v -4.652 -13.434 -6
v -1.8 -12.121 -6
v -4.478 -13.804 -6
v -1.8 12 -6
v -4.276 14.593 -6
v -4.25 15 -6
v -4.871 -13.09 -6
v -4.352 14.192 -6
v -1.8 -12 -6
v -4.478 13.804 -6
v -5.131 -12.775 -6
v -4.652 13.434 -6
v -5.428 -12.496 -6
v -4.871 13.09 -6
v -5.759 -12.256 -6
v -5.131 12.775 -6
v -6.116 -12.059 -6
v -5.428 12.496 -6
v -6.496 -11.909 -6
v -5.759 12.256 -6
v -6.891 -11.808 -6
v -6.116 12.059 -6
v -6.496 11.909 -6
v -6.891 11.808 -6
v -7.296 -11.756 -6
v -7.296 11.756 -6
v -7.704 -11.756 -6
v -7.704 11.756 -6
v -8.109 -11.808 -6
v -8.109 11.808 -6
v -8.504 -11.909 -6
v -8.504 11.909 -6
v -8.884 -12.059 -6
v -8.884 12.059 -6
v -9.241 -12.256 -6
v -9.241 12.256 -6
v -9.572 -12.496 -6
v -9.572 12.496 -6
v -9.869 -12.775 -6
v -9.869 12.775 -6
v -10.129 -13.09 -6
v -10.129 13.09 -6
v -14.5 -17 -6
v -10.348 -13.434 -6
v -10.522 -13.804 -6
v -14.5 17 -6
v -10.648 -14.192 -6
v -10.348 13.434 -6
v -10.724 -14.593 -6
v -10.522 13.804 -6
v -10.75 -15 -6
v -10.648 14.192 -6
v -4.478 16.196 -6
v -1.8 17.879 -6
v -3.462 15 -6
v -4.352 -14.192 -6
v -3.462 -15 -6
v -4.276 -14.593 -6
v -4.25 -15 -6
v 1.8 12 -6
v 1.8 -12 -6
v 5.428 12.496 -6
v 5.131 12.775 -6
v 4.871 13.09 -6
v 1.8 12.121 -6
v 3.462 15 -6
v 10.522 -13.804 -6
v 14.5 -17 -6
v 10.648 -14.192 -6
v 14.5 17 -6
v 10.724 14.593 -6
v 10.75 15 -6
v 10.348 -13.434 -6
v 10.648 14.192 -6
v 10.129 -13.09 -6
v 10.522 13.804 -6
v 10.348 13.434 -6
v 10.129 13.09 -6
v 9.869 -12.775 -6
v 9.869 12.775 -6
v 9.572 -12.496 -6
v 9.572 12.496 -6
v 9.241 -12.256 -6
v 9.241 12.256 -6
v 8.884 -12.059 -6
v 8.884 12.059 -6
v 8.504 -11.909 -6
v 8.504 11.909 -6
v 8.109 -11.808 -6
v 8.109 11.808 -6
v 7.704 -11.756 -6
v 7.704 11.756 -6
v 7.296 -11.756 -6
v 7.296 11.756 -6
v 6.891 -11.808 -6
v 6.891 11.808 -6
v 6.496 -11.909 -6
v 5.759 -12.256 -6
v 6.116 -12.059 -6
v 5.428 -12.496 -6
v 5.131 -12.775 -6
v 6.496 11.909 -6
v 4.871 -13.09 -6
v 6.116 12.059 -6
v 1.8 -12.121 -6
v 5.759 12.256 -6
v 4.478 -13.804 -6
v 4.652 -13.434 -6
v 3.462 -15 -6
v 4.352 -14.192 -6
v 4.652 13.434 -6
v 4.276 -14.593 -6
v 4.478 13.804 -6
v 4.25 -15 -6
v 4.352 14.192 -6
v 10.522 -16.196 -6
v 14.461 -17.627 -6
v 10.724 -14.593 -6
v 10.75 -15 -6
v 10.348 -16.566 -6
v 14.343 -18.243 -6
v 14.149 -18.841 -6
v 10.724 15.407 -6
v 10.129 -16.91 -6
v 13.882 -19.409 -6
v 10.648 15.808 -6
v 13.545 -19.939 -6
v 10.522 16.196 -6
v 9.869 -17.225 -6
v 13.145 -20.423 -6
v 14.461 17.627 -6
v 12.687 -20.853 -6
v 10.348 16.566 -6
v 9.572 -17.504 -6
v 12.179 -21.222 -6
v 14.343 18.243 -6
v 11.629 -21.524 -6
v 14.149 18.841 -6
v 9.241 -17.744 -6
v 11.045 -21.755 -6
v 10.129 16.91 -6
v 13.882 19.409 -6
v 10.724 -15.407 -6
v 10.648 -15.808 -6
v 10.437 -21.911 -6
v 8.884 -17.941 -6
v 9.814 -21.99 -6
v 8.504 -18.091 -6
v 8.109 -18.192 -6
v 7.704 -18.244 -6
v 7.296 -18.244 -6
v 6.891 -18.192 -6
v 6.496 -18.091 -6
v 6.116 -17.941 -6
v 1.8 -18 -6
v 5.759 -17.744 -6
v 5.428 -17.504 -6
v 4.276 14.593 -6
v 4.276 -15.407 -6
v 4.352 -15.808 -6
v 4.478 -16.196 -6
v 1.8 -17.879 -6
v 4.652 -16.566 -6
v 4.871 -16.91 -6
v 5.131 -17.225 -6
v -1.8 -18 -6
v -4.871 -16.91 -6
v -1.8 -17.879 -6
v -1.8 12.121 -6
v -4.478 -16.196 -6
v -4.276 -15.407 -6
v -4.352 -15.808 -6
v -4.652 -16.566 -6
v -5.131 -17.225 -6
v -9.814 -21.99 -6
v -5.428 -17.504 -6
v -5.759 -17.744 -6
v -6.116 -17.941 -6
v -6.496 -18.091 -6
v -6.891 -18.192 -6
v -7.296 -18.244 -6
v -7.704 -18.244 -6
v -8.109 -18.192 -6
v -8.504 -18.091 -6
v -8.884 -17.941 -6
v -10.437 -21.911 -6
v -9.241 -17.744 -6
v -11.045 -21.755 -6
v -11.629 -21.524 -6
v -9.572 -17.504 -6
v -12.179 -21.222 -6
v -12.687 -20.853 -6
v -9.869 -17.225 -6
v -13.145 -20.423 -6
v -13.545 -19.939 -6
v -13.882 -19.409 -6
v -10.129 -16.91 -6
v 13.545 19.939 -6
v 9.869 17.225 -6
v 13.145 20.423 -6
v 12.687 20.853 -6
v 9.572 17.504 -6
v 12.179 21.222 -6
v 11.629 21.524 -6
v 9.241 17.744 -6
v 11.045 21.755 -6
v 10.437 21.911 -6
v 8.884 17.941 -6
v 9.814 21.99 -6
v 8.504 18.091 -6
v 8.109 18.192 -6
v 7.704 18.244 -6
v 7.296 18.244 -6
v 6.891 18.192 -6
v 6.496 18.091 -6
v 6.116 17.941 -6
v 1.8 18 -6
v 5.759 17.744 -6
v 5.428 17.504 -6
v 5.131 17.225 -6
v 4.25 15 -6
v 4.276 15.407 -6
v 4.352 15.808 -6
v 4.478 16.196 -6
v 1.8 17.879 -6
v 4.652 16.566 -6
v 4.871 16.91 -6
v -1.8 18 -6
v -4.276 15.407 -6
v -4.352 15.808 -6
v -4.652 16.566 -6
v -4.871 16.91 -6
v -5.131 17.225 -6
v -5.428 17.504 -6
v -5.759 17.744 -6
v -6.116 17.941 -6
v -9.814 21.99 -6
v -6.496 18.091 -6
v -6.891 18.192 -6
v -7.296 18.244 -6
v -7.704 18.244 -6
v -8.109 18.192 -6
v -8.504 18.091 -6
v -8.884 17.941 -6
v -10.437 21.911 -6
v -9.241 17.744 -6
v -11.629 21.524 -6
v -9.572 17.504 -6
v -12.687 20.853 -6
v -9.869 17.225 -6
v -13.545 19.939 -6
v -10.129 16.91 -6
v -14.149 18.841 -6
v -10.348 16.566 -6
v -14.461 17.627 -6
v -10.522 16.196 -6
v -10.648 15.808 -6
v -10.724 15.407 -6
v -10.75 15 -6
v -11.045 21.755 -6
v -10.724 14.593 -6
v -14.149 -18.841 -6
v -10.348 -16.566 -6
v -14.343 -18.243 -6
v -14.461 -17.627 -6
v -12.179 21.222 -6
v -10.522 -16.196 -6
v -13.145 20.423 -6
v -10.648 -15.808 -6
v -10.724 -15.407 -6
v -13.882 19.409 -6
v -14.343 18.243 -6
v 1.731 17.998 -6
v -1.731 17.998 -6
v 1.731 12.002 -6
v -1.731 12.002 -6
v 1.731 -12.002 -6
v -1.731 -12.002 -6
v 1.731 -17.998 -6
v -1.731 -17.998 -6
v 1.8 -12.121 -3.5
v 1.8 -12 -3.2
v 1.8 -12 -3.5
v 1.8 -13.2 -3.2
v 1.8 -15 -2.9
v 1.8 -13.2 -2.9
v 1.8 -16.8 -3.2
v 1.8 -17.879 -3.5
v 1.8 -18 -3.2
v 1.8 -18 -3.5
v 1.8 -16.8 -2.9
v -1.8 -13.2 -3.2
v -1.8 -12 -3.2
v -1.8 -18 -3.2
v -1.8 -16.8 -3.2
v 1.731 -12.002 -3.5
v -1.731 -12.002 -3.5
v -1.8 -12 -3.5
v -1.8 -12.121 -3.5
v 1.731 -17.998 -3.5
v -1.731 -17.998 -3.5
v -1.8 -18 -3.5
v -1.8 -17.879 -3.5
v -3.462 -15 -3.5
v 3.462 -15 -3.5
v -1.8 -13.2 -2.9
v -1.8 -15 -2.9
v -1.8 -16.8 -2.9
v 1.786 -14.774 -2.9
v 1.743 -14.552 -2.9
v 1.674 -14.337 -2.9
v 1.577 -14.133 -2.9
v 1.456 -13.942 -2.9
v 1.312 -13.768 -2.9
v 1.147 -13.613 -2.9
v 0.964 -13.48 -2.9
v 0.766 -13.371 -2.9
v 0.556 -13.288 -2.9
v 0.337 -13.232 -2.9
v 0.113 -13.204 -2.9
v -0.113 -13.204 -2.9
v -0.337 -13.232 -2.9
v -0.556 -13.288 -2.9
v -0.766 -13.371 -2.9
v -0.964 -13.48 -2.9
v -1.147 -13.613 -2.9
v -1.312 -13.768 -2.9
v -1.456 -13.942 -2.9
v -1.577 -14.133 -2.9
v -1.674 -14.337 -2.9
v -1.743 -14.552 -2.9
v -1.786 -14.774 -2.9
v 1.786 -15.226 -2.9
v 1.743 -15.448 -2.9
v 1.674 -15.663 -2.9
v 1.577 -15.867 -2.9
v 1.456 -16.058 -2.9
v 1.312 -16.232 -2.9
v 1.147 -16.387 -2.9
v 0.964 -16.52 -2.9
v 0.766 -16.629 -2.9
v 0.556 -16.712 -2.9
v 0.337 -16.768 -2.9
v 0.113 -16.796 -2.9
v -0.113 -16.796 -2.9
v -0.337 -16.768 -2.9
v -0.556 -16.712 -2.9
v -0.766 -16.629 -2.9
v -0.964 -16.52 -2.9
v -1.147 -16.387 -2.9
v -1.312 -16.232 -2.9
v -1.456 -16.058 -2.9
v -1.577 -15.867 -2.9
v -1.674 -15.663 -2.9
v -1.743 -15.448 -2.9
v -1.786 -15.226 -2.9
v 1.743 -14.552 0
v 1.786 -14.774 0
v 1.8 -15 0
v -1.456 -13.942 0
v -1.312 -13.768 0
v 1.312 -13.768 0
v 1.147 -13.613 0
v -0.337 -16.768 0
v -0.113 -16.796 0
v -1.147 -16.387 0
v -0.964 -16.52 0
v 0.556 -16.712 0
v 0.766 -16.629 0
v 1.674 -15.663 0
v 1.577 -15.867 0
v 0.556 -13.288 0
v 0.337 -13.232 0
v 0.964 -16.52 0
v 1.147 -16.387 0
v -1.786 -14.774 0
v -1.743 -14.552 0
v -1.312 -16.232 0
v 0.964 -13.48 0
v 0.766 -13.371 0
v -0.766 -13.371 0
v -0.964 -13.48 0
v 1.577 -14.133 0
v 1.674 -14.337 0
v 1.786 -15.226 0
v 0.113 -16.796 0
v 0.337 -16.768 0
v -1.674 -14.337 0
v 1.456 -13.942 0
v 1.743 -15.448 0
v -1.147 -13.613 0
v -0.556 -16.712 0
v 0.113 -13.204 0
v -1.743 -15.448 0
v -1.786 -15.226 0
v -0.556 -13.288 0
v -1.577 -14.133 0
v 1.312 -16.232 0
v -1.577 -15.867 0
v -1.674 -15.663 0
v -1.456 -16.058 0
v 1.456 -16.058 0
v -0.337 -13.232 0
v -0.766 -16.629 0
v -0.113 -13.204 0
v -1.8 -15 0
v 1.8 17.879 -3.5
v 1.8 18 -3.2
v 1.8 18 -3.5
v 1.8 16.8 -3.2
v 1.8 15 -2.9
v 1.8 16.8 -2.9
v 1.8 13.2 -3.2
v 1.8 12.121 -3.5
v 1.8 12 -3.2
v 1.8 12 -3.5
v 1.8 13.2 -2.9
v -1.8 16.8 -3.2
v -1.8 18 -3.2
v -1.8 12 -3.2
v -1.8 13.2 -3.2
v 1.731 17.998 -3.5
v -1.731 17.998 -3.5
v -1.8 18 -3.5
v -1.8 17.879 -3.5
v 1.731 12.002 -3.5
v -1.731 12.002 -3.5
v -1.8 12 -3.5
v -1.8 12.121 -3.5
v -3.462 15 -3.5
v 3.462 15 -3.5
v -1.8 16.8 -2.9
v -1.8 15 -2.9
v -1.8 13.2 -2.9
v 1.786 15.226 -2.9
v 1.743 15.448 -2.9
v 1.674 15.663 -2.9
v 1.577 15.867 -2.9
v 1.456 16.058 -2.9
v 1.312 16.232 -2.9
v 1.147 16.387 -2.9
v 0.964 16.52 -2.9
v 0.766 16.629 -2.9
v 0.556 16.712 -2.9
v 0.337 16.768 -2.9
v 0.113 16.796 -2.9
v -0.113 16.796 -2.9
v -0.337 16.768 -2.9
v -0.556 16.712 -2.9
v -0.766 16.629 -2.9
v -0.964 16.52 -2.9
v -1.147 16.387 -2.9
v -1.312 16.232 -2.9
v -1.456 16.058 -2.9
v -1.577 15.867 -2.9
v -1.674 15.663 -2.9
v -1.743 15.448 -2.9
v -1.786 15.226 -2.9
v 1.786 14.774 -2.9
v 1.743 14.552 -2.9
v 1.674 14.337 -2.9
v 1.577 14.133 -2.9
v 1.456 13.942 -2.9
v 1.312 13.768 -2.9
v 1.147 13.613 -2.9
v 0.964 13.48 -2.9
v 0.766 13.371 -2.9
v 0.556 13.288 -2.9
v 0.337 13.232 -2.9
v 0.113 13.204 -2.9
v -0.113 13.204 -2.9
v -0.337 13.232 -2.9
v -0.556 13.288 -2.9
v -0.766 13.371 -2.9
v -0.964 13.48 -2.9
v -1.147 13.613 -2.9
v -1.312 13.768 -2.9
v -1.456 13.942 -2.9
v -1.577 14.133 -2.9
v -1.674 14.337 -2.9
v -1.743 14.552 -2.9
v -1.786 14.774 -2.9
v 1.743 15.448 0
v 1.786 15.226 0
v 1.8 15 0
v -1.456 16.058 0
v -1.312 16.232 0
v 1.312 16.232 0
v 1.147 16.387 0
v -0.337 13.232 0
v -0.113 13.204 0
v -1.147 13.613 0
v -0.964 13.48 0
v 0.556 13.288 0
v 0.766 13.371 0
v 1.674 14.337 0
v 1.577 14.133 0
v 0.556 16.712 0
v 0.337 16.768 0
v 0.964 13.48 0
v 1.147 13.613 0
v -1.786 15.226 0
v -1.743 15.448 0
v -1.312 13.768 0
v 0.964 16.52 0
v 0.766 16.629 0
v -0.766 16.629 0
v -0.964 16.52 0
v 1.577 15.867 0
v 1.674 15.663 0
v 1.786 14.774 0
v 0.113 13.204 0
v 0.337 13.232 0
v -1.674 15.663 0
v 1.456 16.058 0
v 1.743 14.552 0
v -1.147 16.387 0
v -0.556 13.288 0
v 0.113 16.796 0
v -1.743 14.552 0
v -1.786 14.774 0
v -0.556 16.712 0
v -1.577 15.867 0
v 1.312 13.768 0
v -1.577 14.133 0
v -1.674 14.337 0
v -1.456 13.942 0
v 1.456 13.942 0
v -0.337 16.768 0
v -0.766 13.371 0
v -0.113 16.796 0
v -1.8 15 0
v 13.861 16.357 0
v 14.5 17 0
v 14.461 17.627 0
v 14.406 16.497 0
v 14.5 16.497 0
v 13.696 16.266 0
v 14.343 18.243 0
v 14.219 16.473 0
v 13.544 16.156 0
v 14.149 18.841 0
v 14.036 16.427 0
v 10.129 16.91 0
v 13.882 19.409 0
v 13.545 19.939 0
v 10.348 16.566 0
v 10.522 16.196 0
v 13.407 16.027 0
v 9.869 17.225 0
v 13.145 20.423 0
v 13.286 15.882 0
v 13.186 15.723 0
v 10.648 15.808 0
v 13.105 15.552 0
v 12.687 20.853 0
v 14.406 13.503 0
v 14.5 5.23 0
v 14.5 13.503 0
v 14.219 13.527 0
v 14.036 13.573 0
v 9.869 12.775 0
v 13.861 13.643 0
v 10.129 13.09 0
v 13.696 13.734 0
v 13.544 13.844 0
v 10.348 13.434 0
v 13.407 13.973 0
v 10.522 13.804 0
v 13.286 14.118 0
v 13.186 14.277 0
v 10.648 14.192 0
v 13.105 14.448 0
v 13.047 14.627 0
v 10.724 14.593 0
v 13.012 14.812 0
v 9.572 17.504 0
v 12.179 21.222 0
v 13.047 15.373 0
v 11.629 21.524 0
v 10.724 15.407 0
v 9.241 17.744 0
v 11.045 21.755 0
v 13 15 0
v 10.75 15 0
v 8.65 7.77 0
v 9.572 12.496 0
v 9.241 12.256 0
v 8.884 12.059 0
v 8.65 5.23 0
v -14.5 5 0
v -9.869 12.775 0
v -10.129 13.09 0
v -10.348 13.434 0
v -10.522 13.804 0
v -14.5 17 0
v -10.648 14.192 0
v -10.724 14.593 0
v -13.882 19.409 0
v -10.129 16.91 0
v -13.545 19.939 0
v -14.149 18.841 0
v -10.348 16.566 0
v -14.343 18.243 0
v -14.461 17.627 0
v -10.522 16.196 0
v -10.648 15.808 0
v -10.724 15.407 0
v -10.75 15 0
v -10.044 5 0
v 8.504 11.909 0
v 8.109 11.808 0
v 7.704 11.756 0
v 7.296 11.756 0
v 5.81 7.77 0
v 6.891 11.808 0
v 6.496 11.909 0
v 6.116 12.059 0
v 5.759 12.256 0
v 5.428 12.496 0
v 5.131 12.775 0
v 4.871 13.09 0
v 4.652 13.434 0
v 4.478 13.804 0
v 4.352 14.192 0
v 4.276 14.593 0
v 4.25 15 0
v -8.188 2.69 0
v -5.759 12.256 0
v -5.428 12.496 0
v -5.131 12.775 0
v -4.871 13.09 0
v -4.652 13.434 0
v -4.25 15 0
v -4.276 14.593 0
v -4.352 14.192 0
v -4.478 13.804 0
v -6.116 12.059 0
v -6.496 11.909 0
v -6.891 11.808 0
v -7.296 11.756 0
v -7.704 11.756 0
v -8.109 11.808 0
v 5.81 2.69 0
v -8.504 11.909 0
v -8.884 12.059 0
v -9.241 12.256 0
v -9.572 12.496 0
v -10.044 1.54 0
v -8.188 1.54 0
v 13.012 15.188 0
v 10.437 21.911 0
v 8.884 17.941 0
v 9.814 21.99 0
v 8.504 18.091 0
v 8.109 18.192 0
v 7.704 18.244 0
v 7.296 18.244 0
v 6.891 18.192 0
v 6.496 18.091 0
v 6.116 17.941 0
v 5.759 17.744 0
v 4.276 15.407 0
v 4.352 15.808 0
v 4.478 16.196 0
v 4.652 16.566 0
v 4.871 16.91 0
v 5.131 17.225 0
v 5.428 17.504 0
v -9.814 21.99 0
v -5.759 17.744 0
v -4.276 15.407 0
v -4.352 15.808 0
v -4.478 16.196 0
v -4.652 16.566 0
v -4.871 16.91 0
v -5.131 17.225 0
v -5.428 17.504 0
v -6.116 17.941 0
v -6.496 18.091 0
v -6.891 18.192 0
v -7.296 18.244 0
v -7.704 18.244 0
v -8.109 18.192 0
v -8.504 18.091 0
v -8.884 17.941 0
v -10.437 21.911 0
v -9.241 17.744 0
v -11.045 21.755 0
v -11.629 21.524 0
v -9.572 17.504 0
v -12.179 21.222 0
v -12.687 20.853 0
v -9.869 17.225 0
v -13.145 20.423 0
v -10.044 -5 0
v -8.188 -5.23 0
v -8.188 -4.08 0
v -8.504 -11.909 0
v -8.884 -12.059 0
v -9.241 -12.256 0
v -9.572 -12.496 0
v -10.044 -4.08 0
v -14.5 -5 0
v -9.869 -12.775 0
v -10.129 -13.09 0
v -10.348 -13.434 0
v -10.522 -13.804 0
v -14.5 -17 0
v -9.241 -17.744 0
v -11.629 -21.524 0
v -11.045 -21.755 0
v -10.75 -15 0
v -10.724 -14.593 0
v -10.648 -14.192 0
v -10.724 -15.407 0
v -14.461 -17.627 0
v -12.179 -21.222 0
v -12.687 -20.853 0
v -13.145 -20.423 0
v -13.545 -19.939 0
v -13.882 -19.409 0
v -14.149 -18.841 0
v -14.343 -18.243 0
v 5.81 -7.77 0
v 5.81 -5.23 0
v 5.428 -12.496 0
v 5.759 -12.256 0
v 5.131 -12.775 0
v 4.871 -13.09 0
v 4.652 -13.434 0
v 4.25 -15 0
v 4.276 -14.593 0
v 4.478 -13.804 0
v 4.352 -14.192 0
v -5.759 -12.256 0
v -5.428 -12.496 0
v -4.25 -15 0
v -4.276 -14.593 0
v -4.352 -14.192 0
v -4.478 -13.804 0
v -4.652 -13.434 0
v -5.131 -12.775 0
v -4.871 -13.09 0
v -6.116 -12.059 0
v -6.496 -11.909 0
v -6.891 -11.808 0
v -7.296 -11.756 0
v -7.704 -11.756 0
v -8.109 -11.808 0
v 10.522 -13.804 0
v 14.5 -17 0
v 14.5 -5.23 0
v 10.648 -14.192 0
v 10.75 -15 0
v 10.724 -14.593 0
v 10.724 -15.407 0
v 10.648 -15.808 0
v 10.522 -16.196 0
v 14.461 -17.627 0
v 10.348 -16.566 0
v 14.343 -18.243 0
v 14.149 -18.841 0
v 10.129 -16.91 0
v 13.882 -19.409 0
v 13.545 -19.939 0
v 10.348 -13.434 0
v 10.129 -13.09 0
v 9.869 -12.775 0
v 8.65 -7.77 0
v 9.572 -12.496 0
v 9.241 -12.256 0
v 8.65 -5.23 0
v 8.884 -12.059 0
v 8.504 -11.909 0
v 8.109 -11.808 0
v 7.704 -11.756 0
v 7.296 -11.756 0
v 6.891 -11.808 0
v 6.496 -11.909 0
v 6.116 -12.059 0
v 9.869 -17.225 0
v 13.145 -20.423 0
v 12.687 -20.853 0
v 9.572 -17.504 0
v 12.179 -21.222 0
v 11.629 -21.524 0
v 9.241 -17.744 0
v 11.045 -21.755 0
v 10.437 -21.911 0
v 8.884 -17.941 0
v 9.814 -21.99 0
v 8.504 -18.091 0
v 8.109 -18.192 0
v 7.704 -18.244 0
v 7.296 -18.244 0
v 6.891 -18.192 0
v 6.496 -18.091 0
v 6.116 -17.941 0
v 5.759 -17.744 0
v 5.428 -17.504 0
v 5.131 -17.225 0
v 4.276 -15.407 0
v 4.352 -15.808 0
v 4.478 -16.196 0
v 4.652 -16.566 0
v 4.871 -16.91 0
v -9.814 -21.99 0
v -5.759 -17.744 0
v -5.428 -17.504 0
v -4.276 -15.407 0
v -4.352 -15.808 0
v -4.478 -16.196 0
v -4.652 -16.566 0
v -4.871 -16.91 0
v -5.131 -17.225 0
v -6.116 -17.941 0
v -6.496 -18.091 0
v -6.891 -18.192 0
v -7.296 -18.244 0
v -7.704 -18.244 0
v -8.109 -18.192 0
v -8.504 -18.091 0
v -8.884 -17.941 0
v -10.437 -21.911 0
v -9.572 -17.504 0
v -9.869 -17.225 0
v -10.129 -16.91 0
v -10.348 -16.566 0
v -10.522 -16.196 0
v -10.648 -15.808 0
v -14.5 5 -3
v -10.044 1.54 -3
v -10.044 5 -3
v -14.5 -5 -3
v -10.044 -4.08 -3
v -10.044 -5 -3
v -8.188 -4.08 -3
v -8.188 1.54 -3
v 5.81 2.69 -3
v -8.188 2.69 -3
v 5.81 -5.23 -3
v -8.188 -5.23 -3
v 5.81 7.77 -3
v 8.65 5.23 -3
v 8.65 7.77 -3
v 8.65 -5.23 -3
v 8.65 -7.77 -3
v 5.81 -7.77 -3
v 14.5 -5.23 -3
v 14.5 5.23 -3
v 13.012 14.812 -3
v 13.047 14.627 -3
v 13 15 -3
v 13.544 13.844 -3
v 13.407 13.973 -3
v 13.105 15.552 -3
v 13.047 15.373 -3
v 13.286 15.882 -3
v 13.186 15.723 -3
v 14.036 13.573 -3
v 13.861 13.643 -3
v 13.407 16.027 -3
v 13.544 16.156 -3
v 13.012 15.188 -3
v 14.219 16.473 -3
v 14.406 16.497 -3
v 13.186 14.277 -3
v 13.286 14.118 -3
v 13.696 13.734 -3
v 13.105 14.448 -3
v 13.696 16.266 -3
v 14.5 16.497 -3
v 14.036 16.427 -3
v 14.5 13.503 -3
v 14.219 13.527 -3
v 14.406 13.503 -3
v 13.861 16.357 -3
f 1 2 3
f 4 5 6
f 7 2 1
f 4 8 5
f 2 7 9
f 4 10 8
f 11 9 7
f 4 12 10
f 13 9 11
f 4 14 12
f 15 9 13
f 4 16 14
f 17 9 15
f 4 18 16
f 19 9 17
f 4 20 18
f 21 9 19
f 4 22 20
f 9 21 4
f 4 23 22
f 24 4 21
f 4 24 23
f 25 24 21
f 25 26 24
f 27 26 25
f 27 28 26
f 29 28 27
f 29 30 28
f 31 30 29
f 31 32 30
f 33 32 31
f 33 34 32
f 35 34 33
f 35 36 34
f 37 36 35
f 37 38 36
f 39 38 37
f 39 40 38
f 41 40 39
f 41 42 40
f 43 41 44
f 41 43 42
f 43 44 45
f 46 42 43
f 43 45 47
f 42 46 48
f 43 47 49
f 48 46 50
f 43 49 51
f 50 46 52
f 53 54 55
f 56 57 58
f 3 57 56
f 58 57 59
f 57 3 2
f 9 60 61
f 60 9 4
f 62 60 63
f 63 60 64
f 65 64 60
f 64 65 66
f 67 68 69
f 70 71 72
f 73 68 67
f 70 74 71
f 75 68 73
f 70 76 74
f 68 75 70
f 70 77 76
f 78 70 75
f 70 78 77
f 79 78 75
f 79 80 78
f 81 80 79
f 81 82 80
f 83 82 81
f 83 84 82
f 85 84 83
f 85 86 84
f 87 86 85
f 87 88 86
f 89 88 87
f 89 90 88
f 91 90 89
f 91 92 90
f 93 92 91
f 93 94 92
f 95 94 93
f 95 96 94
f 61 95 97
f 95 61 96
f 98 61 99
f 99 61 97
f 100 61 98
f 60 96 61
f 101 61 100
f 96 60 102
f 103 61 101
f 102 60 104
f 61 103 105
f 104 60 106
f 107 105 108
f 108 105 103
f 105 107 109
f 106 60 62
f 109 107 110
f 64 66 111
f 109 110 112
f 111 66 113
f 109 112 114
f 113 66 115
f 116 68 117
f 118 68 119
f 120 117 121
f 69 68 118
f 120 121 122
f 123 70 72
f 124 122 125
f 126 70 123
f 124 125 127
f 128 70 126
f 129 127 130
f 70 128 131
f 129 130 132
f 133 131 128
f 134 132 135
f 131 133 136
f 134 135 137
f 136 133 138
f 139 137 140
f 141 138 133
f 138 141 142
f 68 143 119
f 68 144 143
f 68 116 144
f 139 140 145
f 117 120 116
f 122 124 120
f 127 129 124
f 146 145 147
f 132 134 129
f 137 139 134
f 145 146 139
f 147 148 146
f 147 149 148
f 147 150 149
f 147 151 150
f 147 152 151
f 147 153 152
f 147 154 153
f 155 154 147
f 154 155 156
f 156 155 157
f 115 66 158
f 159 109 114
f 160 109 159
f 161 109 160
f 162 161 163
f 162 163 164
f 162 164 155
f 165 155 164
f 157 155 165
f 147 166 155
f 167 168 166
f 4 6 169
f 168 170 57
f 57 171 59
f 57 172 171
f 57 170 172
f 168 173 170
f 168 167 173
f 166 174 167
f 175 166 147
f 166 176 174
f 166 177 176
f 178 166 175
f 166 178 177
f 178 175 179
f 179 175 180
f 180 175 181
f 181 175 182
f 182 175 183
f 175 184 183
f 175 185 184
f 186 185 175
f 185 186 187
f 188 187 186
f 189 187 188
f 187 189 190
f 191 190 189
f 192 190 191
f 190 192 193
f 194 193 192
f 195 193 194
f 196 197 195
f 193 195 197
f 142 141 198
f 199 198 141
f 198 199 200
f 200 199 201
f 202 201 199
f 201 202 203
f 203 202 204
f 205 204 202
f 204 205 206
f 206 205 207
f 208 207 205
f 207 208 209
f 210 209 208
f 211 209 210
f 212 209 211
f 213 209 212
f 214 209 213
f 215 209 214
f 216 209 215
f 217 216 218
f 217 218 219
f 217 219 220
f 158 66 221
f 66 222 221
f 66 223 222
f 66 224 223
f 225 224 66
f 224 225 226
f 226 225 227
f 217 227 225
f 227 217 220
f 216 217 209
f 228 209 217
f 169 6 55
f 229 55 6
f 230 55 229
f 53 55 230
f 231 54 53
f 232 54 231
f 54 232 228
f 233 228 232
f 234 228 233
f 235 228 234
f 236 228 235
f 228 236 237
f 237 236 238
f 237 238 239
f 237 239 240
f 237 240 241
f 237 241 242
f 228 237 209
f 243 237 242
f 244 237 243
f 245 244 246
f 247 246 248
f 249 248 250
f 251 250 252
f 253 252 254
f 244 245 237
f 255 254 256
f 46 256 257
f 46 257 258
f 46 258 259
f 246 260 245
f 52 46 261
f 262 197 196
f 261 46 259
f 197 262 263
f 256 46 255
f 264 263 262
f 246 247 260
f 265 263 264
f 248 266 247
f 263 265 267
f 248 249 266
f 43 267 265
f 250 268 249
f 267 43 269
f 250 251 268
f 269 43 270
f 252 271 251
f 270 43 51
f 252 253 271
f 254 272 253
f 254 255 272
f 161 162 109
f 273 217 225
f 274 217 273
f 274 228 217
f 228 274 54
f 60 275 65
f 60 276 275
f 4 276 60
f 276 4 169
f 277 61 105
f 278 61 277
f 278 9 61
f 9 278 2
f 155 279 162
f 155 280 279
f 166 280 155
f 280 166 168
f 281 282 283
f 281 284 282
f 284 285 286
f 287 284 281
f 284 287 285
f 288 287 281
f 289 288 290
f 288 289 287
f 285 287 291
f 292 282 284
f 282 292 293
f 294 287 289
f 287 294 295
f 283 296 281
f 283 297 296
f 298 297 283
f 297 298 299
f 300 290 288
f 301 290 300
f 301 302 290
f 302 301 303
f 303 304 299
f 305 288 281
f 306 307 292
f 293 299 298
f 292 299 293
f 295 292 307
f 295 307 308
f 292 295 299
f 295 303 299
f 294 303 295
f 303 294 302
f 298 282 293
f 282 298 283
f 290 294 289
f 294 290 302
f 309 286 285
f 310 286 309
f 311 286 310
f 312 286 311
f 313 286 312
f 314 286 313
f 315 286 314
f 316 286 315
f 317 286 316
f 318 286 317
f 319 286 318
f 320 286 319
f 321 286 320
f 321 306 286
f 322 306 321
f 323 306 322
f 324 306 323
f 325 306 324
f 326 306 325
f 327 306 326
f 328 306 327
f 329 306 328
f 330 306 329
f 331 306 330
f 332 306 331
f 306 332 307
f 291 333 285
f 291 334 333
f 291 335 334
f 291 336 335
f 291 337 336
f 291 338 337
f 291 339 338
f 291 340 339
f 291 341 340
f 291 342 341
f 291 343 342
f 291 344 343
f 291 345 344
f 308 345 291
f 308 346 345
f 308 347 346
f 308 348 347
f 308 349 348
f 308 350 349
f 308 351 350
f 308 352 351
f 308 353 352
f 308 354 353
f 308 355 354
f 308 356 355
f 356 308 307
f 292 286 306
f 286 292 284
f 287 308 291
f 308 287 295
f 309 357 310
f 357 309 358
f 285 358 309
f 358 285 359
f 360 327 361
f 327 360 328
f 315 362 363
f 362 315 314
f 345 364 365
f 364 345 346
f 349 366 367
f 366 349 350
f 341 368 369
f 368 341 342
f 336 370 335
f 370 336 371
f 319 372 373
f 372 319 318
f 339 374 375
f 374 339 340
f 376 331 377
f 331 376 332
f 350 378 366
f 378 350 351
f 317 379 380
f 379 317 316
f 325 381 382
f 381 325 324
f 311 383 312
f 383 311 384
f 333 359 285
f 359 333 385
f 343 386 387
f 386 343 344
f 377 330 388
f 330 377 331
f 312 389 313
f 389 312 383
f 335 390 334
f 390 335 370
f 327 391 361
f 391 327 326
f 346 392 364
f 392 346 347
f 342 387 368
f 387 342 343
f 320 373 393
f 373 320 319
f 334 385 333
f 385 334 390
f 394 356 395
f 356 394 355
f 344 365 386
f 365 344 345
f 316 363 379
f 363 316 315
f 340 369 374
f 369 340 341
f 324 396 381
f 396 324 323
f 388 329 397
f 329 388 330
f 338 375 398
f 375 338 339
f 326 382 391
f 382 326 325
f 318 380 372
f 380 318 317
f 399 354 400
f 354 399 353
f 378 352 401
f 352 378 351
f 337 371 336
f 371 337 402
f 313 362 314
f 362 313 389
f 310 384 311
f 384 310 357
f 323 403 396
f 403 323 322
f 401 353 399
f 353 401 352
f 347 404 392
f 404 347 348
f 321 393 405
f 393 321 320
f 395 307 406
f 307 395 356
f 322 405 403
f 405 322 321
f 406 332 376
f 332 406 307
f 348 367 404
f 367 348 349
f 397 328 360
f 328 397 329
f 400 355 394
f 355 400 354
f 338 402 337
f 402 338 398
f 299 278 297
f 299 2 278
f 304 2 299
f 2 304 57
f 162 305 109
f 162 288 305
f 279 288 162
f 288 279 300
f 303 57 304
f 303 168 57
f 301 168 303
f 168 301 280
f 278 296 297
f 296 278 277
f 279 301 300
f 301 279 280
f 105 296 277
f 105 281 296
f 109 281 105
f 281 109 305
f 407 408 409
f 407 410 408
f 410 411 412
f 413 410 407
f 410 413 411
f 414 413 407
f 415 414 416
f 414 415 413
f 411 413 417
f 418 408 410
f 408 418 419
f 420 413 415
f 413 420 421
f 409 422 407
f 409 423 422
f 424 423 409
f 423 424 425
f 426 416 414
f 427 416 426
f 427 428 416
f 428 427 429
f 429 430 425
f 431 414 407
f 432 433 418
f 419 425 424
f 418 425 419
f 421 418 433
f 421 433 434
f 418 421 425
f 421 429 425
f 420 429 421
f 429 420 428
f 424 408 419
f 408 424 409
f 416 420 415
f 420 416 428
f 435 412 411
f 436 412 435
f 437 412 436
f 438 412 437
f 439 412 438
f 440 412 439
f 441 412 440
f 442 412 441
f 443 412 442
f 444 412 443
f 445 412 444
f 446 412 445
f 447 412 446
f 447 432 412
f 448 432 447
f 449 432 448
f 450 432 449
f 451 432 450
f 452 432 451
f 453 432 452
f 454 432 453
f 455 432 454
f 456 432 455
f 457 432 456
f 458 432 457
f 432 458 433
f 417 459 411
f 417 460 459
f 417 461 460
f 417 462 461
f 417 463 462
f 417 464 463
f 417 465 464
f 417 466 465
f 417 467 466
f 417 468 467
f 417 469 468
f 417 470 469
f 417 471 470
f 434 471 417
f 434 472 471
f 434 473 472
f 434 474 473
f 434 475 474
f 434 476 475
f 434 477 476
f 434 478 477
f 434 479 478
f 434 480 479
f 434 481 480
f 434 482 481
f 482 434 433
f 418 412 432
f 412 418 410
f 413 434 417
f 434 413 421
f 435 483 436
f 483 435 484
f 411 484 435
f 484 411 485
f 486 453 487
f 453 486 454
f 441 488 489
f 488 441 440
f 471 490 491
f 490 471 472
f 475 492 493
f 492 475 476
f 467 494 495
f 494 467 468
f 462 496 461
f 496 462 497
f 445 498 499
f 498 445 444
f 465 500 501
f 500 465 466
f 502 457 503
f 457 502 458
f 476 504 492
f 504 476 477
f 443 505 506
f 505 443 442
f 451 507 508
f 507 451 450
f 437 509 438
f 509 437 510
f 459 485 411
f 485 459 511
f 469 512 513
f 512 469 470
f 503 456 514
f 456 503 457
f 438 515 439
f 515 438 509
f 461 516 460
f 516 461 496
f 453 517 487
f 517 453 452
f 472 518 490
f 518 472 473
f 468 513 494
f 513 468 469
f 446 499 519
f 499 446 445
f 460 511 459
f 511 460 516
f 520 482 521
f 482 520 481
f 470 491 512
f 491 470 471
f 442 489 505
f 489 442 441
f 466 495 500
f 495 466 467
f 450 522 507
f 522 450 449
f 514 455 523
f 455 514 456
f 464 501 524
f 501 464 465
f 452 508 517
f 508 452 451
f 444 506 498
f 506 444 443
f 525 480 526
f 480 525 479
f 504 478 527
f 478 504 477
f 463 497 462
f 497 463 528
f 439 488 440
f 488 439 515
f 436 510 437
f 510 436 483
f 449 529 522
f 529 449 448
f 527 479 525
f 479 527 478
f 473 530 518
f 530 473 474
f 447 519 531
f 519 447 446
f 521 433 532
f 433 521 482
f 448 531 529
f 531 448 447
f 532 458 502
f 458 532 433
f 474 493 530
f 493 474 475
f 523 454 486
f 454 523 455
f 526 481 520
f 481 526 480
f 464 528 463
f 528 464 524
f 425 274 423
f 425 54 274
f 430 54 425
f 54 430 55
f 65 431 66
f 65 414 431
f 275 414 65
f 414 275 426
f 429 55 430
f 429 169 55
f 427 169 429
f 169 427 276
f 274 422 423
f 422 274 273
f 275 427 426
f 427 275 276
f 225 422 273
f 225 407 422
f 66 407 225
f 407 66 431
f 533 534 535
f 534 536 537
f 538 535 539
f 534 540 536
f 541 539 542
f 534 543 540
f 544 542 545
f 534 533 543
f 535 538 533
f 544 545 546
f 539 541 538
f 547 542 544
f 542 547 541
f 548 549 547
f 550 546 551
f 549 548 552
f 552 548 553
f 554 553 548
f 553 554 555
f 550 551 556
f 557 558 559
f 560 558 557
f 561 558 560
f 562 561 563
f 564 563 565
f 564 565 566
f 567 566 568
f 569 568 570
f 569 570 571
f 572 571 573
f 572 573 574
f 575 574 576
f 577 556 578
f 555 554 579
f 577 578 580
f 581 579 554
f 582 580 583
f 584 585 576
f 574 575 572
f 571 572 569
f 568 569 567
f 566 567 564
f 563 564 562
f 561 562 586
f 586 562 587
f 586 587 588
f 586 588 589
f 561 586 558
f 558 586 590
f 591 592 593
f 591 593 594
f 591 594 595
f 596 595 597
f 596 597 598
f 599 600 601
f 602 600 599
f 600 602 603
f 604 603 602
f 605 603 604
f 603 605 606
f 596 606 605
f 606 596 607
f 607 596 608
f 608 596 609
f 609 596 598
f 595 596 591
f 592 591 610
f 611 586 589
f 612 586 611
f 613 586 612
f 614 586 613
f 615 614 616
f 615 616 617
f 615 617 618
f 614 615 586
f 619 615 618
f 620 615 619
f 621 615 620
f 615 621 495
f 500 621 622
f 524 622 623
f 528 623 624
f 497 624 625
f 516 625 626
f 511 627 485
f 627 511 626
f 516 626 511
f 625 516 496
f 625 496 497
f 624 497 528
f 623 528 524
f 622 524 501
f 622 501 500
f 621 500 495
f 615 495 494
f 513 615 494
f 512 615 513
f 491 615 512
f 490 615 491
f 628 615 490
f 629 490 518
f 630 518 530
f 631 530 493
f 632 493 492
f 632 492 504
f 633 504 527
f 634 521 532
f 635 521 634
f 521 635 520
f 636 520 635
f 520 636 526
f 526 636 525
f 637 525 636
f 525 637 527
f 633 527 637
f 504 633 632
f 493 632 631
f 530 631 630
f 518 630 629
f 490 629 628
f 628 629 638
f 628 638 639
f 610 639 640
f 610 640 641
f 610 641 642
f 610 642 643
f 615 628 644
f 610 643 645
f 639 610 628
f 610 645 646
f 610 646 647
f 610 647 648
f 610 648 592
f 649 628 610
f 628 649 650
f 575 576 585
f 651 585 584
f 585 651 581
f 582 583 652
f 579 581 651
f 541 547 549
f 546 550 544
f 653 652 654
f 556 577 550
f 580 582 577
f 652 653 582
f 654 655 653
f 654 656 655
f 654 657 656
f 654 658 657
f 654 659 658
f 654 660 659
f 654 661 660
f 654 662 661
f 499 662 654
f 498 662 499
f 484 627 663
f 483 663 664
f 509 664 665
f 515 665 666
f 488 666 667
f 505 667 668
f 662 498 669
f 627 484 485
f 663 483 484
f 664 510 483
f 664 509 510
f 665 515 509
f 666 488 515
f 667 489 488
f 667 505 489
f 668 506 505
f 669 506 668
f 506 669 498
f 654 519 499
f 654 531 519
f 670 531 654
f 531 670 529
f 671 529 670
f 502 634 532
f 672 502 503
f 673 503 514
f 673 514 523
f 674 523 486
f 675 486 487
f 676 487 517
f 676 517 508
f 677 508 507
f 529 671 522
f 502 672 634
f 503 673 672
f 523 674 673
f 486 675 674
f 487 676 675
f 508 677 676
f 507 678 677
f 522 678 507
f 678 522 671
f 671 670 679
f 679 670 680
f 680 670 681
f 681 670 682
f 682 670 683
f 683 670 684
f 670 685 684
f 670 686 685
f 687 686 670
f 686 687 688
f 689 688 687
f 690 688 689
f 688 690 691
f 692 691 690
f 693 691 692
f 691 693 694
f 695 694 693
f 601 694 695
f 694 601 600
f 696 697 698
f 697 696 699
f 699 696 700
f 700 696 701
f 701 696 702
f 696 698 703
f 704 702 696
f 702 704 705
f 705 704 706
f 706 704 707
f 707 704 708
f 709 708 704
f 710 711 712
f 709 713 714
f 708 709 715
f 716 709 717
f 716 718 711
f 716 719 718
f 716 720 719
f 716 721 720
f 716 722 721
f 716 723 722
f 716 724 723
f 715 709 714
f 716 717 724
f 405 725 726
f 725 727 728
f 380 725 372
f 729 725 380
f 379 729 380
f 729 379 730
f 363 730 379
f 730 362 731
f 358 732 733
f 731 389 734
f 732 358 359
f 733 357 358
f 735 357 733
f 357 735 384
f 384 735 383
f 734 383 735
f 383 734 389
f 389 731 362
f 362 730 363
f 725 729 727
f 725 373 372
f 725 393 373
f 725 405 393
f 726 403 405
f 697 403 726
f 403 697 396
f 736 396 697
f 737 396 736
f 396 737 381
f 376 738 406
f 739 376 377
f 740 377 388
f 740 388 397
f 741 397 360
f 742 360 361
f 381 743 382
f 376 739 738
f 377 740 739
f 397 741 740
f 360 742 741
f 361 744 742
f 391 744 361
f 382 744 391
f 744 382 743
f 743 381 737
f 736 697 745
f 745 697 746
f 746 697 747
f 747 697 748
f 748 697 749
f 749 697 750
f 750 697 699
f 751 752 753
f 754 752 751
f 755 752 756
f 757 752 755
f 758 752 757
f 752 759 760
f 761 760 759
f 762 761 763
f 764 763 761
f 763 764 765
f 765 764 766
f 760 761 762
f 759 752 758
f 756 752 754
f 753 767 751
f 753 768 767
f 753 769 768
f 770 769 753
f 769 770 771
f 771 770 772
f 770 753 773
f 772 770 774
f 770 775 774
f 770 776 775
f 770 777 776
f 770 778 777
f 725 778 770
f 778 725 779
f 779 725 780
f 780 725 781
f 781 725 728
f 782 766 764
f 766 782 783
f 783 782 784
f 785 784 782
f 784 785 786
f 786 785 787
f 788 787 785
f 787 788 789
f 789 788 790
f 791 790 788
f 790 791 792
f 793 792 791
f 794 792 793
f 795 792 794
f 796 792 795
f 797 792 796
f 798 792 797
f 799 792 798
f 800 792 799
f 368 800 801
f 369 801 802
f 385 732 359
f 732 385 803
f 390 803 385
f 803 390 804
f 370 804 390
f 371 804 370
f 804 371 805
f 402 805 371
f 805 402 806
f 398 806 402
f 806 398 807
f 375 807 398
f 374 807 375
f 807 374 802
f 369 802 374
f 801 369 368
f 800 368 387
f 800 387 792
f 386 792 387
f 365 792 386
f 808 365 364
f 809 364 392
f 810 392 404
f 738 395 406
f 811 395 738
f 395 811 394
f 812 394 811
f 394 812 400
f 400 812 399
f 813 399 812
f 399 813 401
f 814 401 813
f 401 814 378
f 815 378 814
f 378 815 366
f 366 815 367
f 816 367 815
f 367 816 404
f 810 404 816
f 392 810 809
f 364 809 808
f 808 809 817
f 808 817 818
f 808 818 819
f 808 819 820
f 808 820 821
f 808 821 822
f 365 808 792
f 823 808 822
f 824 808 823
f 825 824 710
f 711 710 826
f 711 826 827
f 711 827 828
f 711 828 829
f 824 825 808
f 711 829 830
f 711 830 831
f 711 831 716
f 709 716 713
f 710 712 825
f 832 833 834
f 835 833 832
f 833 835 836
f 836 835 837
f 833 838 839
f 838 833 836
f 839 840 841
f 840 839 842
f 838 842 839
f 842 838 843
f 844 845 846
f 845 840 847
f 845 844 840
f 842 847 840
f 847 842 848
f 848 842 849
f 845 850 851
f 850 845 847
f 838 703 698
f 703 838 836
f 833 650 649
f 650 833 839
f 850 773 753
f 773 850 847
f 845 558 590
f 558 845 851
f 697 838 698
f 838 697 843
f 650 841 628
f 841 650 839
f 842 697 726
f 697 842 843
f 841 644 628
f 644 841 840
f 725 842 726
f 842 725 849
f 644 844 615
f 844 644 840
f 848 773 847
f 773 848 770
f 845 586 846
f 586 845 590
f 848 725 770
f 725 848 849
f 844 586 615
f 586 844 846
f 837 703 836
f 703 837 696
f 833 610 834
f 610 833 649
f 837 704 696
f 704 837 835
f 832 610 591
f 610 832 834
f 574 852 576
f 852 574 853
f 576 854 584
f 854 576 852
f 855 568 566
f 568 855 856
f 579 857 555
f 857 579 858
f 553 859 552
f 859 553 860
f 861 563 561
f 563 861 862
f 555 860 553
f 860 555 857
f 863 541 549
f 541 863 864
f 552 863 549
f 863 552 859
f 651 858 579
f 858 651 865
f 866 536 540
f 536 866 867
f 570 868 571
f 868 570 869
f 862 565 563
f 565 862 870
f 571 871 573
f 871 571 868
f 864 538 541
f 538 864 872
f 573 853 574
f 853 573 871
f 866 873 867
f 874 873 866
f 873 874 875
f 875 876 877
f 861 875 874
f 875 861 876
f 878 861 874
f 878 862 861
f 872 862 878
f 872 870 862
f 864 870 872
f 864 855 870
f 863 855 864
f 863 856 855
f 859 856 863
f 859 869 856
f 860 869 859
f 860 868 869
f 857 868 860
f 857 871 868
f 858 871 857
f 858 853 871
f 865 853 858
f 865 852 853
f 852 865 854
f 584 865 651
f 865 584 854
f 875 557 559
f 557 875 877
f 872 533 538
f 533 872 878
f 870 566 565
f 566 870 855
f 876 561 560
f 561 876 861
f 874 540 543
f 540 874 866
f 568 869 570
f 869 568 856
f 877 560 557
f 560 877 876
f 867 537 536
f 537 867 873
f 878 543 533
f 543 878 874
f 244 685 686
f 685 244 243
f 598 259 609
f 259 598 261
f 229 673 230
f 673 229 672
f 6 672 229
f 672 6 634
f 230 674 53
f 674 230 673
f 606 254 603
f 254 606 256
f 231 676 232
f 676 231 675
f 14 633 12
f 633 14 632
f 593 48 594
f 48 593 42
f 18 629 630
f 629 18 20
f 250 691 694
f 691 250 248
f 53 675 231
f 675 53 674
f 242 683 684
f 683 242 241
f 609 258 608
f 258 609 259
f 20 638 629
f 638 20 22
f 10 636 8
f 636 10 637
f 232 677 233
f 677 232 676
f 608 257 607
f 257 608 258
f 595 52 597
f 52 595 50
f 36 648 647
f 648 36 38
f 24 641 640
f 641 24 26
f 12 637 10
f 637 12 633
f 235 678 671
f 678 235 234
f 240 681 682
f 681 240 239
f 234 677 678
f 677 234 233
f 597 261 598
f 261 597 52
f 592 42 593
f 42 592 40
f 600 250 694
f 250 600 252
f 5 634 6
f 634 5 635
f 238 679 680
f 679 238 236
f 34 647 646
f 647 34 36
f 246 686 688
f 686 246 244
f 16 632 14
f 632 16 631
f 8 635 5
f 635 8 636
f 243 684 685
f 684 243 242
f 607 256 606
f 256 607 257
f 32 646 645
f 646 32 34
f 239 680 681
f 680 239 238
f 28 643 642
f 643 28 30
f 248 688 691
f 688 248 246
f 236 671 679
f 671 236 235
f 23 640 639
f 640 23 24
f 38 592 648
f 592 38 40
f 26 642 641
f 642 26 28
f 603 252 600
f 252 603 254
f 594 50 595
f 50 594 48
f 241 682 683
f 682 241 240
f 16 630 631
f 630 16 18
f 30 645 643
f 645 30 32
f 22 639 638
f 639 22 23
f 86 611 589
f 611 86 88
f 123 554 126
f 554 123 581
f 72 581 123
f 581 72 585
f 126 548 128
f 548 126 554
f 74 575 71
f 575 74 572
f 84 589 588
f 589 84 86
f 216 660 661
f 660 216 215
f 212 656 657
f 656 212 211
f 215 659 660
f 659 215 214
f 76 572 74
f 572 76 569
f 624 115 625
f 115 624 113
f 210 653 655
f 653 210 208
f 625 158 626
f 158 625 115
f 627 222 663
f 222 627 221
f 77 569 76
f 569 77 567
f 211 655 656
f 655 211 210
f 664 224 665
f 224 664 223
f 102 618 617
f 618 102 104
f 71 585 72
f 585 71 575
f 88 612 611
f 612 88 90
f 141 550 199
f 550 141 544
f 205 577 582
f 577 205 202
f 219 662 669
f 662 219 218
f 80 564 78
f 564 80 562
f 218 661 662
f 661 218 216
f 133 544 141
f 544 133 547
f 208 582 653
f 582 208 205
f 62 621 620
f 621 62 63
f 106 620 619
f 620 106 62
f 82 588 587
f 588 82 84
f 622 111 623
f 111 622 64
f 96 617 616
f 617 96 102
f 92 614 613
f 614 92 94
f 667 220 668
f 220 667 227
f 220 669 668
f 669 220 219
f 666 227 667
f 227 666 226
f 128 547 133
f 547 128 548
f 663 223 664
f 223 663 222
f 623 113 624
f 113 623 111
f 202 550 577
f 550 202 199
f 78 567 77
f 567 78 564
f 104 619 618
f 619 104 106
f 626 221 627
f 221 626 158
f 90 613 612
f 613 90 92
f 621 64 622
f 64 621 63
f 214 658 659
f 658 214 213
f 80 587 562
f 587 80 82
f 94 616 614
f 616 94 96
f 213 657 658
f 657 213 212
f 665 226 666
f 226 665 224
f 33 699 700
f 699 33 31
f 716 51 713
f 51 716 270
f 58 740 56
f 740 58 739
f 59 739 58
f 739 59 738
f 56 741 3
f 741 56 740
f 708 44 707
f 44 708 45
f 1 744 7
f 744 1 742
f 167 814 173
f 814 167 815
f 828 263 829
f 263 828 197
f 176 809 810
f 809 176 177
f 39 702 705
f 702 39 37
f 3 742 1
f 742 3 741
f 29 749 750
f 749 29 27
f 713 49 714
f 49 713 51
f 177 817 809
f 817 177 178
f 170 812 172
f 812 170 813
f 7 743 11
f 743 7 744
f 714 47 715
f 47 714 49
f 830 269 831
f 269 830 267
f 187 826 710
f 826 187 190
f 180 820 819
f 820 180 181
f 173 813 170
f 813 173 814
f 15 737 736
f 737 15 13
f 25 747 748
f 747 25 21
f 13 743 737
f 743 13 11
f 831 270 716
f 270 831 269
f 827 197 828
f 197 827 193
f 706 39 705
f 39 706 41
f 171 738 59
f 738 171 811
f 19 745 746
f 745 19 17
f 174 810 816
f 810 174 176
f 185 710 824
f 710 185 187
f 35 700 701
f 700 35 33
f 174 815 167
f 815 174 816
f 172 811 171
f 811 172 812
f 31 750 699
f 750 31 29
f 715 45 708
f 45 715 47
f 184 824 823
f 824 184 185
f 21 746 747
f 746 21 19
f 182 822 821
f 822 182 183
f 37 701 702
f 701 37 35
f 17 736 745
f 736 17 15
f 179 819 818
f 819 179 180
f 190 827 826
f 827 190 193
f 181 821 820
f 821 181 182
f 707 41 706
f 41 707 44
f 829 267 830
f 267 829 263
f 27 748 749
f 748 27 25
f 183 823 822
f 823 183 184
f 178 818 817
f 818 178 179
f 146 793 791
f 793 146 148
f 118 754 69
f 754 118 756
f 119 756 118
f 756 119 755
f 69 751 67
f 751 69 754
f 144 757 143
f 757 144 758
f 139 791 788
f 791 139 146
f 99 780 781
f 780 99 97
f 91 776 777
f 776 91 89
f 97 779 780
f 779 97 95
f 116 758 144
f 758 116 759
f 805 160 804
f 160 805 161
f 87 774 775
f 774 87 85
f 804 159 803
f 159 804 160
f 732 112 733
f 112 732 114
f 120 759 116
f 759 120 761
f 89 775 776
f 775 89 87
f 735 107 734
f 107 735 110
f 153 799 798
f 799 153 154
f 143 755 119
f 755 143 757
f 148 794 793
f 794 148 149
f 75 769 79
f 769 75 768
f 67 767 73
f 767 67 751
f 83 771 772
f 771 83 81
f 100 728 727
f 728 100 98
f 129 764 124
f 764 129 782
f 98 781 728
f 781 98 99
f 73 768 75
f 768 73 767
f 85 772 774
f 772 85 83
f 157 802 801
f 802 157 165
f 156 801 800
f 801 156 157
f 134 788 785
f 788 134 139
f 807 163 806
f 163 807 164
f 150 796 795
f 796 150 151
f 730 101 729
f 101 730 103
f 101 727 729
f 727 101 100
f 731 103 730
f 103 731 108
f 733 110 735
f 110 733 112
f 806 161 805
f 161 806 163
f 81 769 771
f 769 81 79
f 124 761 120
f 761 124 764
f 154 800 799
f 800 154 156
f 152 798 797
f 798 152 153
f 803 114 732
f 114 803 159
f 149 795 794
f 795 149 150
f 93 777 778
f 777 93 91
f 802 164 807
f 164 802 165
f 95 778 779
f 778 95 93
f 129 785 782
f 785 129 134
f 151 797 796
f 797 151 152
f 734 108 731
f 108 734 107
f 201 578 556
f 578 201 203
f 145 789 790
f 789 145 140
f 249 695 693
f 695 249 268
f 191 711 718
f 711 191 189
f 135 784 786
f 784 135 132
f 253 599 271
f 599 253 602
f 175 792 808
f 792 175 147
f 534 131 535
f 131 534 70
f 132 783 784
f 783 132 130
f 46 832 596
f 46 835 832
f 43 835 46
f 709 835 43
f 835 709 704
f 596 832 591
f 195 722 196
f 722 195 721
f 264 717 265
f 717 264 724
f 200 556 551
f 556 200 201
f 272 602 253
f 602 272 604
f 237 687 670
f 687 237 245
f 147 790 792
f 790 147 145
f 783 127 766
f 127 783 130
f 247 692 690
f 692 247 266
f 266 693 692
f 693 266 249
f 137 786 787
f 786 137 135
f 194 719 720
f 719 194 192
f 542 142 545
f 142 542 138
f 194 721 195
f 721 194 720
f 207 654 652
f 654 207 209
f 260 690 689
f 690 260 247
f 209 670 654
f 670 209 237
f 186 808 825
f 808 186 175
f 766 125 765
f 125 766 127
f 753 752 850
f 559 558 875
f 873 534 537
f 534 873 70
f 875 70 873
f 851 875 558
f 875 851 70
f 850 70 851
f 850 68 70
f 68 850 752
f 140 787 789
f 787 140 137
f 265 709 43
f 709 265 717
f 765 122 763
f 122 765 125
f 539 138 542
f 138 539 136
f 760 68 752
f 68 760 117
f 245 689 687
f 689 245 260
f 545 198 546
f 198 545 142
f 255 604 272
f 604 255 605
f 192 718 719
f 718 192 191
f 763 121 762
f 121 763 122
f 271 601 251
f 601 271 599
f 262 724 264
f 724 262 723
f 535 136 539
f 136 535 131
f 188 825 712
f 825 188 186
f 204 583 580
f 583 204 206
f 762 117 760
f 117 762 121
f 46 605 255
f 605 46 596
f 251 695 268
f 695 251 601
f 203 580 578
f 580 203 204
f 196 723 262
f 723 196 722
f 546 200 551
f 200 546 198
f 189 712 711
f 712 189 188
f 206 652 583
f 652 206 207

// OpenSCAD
$fn = 50;


difference() {
	union() {
		*color(alpha = 1.0000000000, c = "gray") {
			translate(v = [0, 14, -6]) {
				linear_extrude(height = 3) {
					text(font = "Arial:style=Bold", halign = "center", size = 4.5000000000, text = "COMMENT description oobb_plate_shape_positive_type_6_depth_0_0_-6_pos_basic_extra_6_thickness_2_width_3_height_0_0_-6_pos_plate", valign = "center");
				}
			}
		}
		translate(v = [0, 0, -6]) {
			hull() {
				translate(v = [-9.5000000000, 17.0000000000, 0]) {
					cylinder(h = 6, r = 5);
				}
				translate(v = [9.5000000000, 17.0000000000, 0]) {
					cylinder(h = 6, r = 5);
				}
				translate(v = [-9.5000000000, -17.0000000000, 0]) {
					cylinder(h = 6, r = 5);
				}
				translate(v = [9.5000000000, -17.0000000000, 0]) {
					cylinder(h = 6, r = 5);
				}
			}
		}
		*color(alpha = 1.0000000000, c = "gray") {
			translate(v = [0, 14, -6]) {
				linear_extrude(height = 3) {
					text(font = "Arial:style=Bold", halign = "center", size = 4.5000000000, text = "COMMENT description oobb_holes_shape_p_type_0_0_-6_pos_basic_extra_6_thickness_2_width_3_height_0_0_-6_pos_plate_'left'_'right'_hole_sides_'left'_'right'_holes_true_both_holes", valign = "center");
				}
			}
		}
		*color(alpha = 1.0000000000, c = "gray") {
			translate(v = [-7.5000000000, 14, -3]) {
				rotate(a = [0, 0, 180]) {
					linear_extrude(height = 3) {
						text(font = "Arial:style=Bold", halign = "center", size = 4.5000000000, text = "COMMENT description oobb_wire_basic_shape_-7.5_0_-3_pos_basic_extra_6_thickness_2_width_3_height_0_0_-6_pos_plate_0_0_180_rot", valign = "center");
					}
				}
			}
		}
	}
	union() {
		translate(v = [0, -15, -6]) {
			rotate(a = [0, 0, 0]) {
				difference() {
					union() {
						translate(v = [-1.8000000000, -3.0000000000, -0.3000000000]) {
							cube(size = [3.6000000000, 6.0000000000, 0.3000000000]);
						}
						translate(v = [-1.8000000000, -1.8000000000, -0.6000000000]) {
							cube(size = [3.6000000000, 3.6000000000, 0.3000000000]);
						}
						translate(v = [-1.8000000000, -3.0000000000, 2.5000000000]) {
							cube(size = [3.6000000000, 6.0000000000, 0.3000000000]);
						}
						translate(v = [-1.8000000000, -1.8000000000, 2.8000000000]) {
							cube(size = [3.6000000000, 3.6000000000, 0.3000000000]);
						}
						translate(v = [0, 0, -50.0000000000]) {
							cylinder(h = 100, r = 1.8000000000);
						}
						linear_extrude(height = 2.5000000000) {
							polygon(points = [[3.4620000000, 0.0000000000], [1.7310000000, 2.9981799479], [-1.7310000000, 2.9981799479], [-3.4620000000, 0.0000000000], [-1.7310000000, -2.9981799479], [1.7310000000, -2.9981799479]]);
						}
						translate(v = [-1.8000000000, -3.0000000000, -0.3000000000]) {
							cube(size = [3.6000000000, 6.0000000000, 0.3000000000]);
						}
						translate(v = [-1.8000000000, -1.8000000000, -0.6000000000]) {
							cube(size = [3.6000000000, 3.6000000000, 0.3000000000]);
						}
						translate(v = [-1.8000000000, -3.0000000000, 2.5000000000]) {
							cube(size = [3.6000000000, 6.0000000000, 0.3000000000]);
						}
						translate(v = [-1.8000000000, -1.8000000000, 2.8000000000]) {
							cube(size = [3.6000000000, 3.6000000000, 0.3000000000]);
						}
						translate(v = [0, 0, -50.0000000000]) {
							cylinder(h = 100, r = 1.8000000000);
						}
						translate(v = [-1.8000000000, -3.0000000000, -0.3000000000]) {
							cube(size = [3.6000000000, 6.0000000000, 0.3000000000]);
						}
						translate(v = [-1.8000000000, -1.8000000000, -0.6000000000]) {
							cube(size = [3.6000000000, 3.6000000000, 0.3000000000]);
						}
						translate(v = [-1.8000000000, -3.0000000000, 2.5000000000]) {
							cube(size = [3.6000000000, 6.0000000000, 0.3000000000]);
						}
						translate(v = [-1.8000000000, -1.8000000000, 2.8000000000]) {
							cube(size = [3.6000000000, 3.6000000000, 0.3000000000]);
						}
						translate(v = [0, 0, -50.0000000000]) {
							cylinder(h = 100, r = 1.8000000000);
						}
					}
					union();
				}
			}
		}
		translate(v = [0, 15, -6]) {
			rotate(a = [0, 0, 0]) {
				difference() {
					union() {
						translate(v = [-1.8000000000, -3.0000000000, -0.3000000000]) {
							cube(size = [3.6000000000, 6.0000000000, 0.3000000000]);
						}
						translate(v = [-1.8000000000, -1.8000000000, -0.6000000000]) {
							cube(size = [3.6000000000, 3.6000000000, 0.3000000000]);
						}
						translate(v = [-1.8000000000, -3.0000000000, 2.5000000000]) {
							cube(size = [3.6000000000, 6.0000000000, 0.3000000000]);
						}
						translate(v = [-1.8000000000, -1.8000000000, 2.8000000000]) {
							cube(size = [3.6000000000, 3.6000000000, 0.3000000000]);
						}
						translate(v = [0, 0, -50.0000000000]) {
							cylinder(h = 100, r = 1.8000000000);
						}
						linear_extrude(height = 2.5000000000) {
							polygon(points = [[3.4620000000, 0.0000000000], [1.7310000000, 2.9981799479], [-1.7310000000, 2.9981799479], [-3.4620000000, 0.0000000000], [-1.7310000000, -2.9981799479], [1.7310000000, -2.9981799479]]);
						}
						translate(v = [-1.8000000000, -3.0000000000, -0.3000000000]) {
							cube(size = [3.6000000000, 6.0000000000, 0.3000000000]);
						}
						translate(v = [-1.8000000000, -1.8000000000, -0.6000000000]) {
							cube(size = [3.6000000000, 3.6000000000, 0.3000000000]);
						}
						translate(v = [-1.8000000000, -3.0000000000, 2.5000000000]) {
							cube(size = [3.6000000000, 6.0000000000, 0.3000000000]);
						}
						translate(v = [-1.8000000000, -1.8000000000, 2.8000000000]) {
							cube(size = [3.6000000000, 3.6000000000, 0.3000000000]);
						}
						translate(v = [0, 0, -50.0000000000]) {
							cylinder(h = 100, r = 1.8000000000);
						}
						translate(v = [-1.8000000000, -3.0000000000, -0.3000000000]) {
							cube(size = [3.6000000000, 6.0000000000, 0.3000000000]);
						}
						translate(v = [-1.8000000000, -1.8000000000, -0.6000000000]) {
							cube(size = [3.6000000000, 3.6000000000, 0.3000000000]);
						}
						translate(v = [-1.8000000000, -3.0000000000, 2.5000000000]) {
							cube(size = [3.6000000000, 6.0000000000, 0.3000000000]);
						}
						translate(v = [-1.8000000000, -1.8000000000, 2.8000000000]) {
							cube(size = [3.6000000000, 3.6000000000, 0.3000000000]);
						}
						translate(v = [0, 0, -50.0000000000]) {
							cylinder(h = 100, r = 1.8000000000);
						}
					}
					union();
				}
			}
		}
		translate(v = [15.0000000000, 0, -3]) {
			rotate(a = [0, 0, 180]) {
				difference() {
					union() {
						#translate(v = [23.0670000000, -1.5400000000, 0]) {
							cube(size = [5, 5.6200000000, 3]);
						}
						#translate(v = [0.2040000000, -5.2300000000, 0]) {
							cube(size = [6.3000000000, 10.4600000000, 3]);
						}
						#translate(v = [8.8880000000, -2.6900000000, 0]) {
							cube(size = [14.3000000000, 7.9200000000, 3]);
						}
						#translate(v = [6.3500000000, -7.7700000000, 0]) {
							cube(size = [2.8400000000, 15.5400000000, 3]);
						}
						#translate(v = [25.0440000000, -5.0000000000, 0]) {
							cube(size = [7, 10, 3]);
						}
						#translate(v = [0.5000000000, -15, 0.0000000000]) {
							cylinder(h = 3, r = 1.5000000000);
						}
					}
					union();
				}
			}
		}
		translate(v = [-7.5000000000, 15.0000000000, -50.0000000000]) {
			cylinder(h = 100, r = 3.2500000000);
		}
		translate(v = [7.5000000000, 15.0000000000, -50.0000000000]) {
			cylinder(h = 100, r = 3.2500000000);
		}
		translate(v = [-7.5000000000, -15.0000000000, -50.0000000000]) {
			cylinder(h = 100, r = 3.2500000000);
		}
		translate(v = [7.5000000000, -15.0000000000, -50.0000000000]) {
			cylinder(h = 100, r = 3.2500000000);
		}
		*color(alpha = 1.0000000000, c = "gray") {
			translate(v = [0, -1, -6]) {
				linear_extrude(height = 3) {
					text(font = "Arial:style=Bold", halign = "center", size = 4.5000000000, text = "COMMENT description oobb_nut_shape_negative_type_m3_radius_name_0_-15_-6_pos_6_thickness_2_width_3_height_0_0_-6_pos_plate_bottom_zz_true_overhang_0_0_0_rot_false_nut_true_hole", valign = "center");
				}
			}
		}
		*color(alpha = 1.0000000000, c = "gray") {
			translate(v = [0, 29, -6]) {
				linear_extrude(height = 3) {
					text(font = "Arial:style=Bold", halign = "center", size = 4.5000000000, text = "COMMENT description oobb_nut_shape_negative_type_m3_radius_name_0_15_-6_pos_6_thickness_2_width_3_height_0_0_-6_pos_plate_bottom_zz_true_overhang_0_0_0_rot_false_nut_true_hole", valign = "center");
				}
			}
		}
	}
}
